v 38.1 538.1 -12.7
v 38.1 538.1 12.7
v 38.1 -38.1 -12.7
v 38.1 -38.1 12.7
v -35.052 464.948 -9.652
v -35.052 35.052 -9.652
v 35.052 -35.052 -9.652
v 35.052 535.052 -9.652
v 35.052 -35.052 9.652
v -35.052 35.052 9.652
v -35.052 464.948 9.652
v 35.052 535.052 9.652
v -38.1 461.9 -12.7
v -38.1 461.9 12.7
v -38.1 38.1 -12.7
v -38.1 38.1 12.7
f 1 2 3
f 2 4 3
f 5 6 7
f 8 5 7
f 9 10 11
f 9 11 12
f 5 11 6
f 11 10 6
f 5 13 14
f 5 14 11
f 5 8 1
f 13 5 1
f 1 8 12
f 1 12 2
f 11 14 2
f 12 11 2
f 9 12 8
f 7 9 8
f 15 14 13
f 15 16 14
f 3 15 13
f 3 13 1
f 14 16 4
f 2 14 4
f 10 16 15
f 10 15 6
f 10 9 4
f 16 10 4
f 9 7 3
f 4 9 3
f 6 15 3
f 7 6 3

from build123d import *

# Parameters (mm, degrees)
SKETCH1_W               = 76.2
SKETCH1_H               = 25.4
SKETCH1_W_2             = 70.104
SKETCH1_H_2             = 19.304
BOSS_EXTRUDE1_DEPTH     = 500
SKETCH3_W               = 76.2
SKETCH3_H               = 25.4
SKETCH3_W_2             = 70.104
SKETCH3_H_2             = 19.304
BOSS_EXTRUDE2_DEPTH     = 38.1
SKETCH4_W               = 76.2
SKETCH4_H               = 25.4
SKETCH4_W_2             = 70.104
SKETCH4_H_2             = 19.304
BOSS_EXTRUDE3_DEPTH     = 38.1
CUT_EXTRUDE1_DEPTH      = 13.7
CUT_EXTRUDE1_DEPTH_BACK = 13.7
CUT_EXTRUDE2_DEPTH      = 13.7
CUT_EXTRUDE2_DEPTH_BACK = 13.7


with BuildPart() as part:
    # Sketch1 → Boss-Extrude1 (new body)
    with BuildSketch(Plane(origin=(0, 0, 0), x_dir=(1, 0, 0), z_dir=(0, 1, 0))):
        Rectangle(SKETCH1_W, SKETCH1_H)
        Rectangle(SKETCH1_W_2, SKETCH1_H_2, mode=Mode.SUBTRACT)
    extrude(amount=BOSS_EXTRUDE1_DEPTH)

    # Sketch3 → Boss-Extrude2 (add)
    with BuildSketch(Plane.XZ):
        Rectangle(SKETCH3_W, SKETCH3_H)
        Rectangle(SKETCH3_W_2, SKETCH3_H_2, mode=Mode.SUBTRACT)
    extrude(amount=BOSS_EXTRUDE2_DEPTH)

    # Sketch4 → Boss-Extrude3 (add)
    with BuildSketch(Plane(origin=(0, 500, 0), x_dir=(1, 0, 0), z_dir=(0, 1, 0))):
        Rectangle(SKETCH4_W, SKETCH4_H)
        Rectangle(SKETCH4_W_2, SKETCH4_H_2, mode=Mode.SUBTRACT)
    extrude(amount=BOSS_EXTRUDE3_DEPTH)

    # Sketch5 → Cut-Extrude1 (cut, two sides)
    with BuildSketch(Plane.XY) as cut_extrude1_sk:
        Polygon((-62.772673854, 62.772673854), (63.030718061, -63.030718061), (-91.484443541, -186.384573668), (-217.287835457, -60.581181752), align=None)
    extrude(amount=CUT_EXTRUDE1_DEPTH, mode=Mode.SUBTRACT)
    extrude(cut_extrude1_sk.sketch, amount=-CUT_EXTRUDE1_DEPTH_BACK, mode=Mode.SUBTRACT)

    # Sketch6 → Cut-Extrude2 (cut, two sides)
    with BuildSketch(Plane.YX) as cut_extrude2_sk:
        Polygon((393.890988206, -106.109011794), (558.855850204, 58.855850204), (555.016088259, -106.109011794), align=None)
    extrude(amount=CUT_EXTRUDE2_DEPTH, mode=Mode.SUBTRACT)
    extrude(cut_extrude2_sk.sketch, amount=-CUT_EXTRUDE2_DEPTH_BACK, mode=Mode.SUBTRACT)


solid = part.part
